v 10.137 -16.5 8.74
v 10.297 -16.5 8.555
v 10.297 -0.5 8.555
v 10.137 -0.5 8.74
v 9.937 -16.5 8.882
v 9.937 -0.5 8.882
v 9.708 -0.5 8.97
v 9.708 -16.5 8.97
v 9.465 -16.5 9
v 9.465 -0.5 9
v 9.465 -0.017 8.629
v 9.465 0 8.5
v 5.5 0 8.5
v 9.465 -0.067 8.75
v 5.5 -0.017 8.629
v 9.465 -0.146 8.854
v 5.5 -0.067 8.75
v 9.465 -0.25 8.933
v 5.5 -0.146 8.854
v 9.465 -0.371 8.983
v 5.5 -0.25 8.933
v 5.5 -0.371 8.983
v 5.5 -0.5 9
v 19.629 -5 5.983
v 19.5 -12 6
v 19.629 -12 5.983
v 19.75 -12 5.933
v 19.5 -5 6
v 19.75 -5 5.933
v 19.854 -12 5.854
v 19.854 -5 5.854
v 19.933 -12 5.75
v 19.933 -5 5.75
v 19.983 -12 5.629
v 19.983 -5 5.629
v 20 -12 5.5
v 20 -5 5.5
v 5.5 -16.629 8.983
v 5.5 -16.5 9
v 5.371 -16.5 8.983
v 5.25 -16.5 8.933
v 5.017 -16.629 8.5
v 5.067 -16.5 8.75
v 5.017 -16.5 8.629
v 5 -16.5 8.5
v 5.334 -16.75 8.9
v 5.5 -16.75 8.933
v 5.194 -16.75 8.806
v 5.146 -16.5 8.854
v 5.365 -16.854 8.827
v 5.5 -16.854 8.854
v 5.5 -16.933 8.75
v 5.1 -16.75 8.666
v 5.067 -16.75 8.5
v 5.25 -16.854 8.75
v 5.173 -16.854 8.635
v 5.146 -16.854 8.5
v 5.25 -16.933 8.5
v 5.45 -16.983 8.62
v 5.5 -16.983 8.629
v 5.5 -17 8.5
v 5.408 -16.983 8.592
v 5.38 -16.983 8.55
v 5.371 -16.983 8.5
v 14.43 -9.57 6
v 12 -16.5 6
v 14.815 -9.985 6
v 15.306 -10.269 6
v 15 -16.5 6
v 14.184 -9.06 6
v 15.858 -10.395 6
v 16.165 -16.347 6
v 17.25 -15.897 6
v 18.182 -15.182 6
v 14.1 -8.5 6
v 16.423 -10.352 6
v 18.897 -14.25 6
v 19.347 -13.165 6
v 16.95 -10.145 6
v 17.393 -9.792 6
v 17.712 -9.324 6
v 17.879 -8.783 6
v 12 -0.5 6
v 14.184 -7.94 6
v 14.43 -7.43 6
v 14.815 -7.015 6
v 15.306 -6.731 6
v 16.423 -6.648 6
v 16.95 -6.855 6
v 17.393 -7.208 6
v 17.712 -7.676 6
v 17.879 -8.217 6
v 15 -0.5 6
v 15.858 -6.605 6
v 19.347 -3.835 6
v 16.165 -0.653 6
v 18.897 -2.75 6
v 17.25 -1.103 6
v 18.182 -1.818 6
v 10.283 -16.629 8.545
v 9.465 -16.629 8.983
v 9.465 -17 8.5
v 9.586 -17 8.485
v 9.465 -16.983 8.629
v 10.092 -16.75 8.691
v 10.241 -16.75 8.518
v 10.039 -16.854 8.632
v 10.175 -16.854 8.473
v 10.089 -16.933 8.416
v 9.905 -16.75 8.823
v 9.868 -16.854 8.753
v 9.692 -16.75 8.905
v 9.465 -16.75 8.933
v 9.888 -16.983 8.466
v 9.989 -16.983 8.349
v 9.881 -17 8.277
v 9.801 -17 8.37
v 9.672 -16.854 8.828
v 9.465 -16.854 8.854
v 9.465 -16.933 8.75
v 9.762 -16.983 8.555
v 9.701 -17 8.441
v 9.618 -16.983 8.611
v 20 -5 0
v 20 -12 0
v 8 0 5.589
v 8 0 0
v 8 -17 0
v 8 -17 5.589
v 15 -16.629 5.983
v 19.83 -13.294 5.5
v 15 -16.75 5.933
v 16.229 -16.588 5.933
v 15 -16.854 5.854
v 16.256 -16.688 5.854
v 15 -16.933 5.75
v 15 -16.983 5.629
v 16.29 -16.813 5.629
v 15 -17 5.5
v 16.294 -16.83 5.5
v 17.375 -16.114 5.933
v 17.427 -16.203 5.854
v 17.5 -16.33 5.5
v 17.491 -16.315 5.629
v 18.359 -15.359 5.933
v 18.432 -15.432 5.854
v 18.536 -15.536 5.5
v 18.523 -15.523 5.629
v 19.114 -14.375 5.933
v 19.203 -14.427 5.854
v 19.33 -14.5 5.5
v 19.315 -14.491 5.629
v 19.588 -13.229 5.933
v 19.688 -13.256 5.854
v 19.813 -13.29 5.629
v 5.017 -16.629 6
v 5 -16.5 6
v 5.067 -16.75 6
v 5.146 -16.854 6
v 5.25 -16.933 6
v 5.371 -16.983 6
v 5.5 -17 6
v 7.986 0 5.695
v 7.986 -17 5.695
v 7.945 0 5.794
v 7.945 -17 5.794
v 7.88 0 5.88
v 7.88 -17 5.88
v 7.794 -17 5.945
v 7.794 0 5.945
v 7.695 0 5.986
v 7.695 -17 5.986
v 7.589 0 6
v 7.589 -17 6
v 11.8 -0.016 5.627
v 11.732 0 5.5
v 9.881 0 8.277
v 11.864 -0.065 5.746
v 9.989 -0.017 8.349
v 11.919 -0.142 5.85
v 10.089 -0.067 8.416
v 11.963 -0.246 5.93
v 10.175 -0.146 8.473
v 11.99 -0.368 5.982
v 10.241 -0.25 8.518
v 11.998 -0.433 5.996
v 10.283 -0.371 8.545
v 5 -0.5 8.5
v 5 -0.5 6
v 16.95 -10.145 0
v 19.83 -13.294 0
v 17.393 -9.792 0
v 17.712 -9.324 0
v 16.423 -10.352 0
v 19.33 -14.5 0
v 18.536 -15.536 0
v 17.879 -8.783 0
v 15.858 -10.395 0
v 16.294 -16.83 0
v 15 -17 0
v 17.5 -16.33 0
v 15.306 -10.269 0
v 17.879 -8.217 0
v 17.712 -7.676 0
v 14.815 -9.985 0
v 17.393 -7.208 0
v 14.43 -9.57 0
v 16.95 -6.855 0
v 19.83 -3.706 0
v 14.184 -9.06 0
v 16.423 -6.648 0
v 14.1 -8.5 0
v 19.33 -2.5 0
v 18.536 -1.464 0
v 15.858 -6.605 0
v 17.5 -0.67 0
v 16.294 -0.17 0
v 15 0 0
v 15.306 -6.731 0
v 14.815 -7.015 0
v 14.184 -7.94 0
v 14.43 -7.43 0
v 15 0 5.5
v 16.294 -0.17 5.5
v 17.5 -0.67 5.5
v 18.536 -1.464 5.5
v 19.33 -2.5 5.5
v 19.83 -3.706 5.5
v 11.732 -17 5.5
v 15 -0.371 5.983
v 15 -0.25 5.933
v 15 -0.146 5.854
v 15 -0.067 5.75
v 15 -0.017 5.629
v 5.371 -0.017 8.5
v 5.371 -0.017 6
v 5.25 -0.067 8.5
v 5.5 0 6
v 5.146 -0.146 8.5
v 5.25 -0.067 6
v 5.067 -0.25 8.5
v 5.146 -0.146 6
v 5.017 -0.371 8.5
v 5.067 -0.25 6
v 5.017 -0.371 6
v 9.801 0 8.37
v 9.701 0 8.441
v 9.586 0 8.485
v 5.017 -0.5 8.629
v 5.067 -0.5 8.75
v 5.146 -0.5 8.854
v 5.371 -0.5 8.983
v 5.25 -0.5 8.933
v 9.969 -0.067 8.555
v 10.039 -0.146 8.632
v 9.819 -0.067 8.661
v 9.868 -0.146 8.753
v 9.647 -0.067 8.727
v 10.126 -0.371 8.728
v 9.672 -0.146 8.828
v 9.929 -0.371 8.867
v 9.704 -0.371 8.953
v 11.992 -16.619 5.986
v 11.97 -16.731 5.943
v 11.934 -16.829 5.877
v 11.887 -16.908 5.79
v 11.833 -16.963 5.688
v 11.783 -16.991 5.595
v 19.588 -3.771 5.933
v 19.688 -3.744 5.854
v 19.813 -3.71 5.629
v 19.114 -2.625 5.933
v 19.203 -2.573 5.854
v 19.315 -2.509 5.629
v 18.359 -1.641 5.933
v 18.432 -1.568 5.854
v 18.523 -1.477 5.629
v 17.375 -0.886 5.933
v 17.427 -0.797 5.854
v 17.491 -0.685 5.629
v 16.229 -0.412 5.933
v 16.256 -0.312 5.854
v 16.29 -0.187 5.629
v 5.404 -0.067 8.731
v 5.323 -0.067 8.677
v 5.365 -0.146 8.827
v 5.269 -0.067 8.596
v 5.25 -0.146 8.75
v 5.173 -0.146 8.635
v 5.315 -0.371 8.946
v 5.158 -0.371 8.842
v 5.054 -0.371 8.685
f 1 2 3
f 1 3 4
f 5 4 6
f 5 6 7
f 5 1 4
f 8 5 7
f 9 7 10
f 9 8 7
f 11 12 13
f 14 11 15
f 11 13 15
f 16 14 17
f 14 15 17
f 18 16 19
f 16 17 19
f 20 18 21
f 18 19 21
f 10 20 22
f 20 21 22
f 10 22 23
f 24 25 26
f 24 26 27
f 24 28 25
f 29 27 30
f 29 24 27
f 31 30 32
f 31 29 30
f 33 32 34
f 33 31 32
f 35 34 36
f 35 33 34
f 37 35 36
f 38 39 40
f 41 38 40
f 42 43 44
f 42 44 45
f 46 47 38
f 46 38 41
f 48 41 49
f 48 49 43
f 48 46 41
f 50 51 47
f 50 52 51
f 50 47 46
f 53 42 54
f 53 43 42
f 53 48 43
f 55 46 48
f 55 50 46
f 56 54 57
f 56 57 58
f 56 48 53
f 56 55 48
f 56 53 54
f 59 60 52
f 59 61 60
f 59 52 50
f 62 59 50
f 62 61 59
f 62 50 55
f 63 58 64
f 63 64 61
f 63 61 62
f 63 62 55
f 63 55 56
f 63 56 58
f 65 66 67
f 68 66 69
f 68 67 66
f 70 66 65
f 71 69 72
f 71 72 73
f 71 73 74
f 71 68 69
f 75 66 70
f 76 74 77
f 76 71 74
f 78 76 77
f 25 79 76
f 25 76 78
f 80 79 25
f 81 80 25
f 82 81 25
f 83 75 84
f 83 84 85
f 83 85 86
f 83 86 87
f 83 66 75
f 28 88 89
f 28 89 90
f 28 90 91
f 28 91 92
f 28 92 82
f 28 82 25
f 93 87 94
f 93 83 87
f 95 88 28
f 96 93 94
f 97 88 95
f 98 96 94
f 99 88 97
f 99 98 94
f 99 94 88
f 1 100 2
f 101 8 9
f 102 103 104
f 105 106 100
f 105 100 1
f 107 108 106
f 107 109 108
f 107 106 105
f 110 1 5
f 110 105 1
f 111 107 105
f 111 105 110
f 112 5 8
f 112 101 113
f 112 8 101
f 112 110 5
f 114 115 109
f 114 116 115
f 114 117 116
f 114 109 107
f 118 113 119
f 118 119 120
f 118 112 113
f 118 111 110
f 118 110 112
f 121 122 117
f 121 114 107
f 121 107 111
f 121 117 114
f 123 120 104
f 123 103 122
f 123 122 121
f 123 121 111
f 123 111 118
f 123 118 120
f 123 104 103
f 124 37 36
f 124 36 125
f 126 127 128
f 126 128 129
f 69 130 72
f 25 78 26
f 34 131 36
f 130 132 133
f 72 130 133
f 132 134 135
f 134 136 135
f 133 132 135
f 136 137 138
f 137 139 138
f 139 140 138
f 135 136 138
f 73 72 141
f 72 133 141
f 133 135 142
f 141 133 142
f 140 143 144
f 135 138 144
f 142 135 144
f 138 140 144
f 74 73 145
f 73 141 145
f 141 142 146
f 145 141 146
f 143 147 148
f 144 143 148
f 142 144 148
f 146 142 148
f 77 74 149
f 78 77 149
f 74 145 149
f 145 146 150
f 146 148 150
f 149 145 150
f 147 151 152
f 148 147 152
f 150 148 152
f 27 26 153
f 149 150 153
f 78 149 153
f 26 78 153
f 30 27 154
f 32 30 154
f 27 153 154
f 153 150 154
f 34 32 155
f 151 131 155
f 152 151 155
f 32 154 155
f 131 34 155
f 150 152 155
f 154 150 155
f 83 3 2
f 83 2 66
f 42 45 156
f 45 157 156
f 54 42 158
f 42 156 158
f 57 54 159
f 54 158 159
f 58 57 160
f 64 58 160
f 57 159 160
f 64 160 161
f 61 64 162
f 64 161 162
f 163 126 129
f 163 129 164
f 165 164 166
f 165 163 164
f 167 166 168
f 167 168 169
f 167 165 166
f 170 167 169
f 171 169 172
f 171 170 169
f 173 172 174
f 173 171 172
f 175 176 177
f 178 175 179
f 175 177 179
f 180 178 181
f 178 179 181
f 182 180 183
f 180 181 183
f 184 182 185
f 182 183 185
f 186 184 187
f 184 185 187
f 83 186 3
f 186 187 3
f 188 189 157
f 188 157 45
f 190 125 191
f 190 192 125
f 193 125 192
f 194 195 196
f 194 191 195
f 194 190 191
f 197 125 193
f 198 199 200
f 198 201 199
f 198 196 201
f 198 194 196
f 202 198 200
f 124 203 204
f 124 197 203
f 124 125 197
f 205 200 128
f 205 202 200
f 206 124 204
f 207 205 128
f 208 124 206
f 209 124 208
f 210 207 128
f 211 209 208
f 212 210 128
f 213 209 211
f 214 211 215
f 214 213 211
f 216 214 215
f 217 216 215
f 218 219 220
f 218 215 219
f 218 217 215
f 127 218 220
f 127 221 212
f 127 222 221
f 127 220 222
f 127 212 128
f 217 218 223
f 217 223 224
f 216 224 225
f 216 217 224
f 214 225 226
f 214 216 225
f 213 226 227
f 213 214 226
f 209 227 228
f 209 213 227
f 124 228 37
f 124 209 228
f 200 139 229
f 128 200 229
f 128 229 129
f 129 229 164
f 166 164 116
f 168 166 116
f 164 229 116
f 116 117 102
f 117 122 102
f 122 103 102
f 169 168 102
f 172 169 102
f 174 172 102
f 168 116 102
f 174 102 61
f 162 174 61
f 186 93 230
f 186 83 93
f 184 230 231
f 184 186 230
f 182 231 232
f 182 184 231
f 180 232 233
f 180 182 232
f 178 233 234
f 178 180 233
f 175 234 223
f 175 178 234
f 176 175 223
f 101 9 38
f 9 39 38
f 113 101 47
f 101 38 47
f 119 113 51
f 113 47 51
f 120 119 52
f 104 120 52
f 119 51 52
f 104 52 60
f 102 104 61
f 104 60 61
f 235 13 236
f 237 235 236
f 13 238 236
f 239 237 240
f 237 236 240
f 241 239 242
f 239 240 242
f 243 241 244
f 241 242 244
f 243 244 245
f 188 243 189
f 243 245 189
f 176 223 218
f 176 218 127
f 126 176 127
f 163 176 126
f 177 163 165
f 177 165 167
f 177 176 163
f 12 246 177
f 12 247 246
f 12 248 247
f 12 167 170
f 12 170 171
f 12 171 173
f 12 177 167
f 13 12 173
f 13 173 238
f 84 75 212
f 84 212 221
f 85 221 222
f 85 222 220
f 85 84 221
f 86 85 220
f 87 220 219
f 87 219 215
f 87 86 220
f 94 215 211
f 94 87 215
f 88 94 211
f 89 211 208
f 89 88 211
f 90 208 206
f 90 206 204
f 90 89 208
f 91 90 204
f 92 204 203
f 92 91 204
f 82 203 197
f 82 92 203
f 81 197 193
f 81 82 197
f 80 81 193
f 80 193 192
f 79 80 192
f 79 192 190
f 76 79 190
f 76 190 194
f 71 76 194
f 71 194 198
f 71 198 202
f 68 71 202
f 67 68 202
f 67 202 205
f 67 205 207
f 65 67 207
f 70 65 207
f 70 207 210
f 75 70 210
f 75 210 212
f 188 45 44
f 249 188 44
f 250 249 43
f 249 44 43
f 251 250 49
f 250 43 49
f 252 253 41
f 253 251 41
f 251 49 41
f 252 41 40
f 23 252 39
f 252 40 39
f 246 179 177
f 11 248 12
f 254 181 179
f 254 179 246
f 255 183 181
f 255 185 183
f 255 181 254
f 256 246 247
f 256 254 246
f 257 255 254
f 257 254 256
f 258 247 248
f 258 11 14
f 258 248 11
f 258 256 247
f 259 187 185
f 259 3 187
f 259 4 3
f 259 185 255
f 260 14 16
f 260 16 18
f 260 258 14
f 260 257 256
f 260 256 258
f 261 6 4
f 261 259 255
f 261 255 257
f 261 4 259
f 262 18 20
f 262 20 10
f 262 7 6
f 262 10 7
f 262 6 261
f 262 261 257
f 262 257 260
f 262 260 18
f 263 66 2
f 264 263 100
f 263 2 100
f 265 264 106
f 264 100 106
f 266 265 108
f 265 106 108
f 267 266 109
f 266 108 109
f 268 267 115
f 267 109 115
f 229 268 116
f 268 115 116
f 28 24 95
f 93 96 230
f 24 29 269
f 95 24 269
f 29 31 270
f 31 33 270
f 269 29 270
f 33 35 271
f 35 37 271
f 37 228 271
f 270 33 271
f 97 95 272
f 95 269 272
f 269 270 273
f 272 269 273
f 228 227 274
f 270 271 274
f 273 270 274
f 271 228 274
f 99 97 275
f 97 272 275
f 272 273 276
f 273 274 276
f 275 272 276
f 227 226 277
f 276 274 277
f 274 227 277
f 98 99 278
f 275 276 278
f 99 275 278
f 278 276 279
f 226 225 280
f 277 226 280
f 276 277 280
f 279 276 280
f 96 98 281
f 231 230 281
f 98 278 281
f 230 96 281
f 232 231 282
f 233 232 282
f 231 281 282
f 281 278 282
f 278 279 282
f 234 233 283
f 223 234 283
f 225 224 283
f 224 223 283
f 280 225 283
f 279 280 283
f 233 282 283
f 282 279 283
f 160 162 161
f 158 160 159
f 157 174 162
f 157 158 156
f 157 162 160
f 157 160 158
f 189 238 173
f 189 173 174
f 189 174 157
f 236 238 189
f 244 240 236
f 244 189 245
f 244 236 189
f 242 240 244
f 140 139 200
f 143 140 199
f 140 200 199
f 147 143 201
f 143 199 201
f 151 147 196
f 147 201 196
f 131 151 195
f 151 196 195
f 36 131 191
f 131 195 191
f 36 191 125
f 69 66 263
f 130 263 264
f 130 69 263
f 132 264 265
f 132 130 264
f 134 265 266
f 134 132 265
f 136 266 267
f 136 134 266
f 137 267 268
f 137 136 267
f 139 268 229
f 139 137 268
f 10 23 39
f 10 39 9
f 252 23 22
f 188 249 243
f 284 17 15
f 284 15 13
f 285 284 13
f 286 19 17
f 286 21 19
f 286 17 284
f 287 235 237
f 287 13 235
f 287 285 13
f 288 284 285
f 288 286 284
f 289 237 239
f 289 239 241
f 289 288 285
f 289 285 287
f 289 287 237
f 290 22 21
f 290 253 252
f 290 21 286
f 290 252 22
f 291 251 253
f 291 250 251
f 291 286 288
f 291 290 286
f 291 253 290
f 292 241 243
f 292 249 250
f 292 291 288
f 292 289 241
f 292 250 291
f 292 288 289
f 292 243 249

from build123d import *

# Parameters (mm, degrees)
F1_DEPTH = 17
F2_R     = 0.5
F3_R     = 1.9
F4_DEPTH = 25
F5_R     = 5
F6_R     = 0.5
F7_R     = 1
F8_R     = 0.49999


# Not quite as in the source:
# - a fillet or chamfer is up to 0.001 mm smaller than in the source, because OpenCascade refuses the exact size


with BuildPart() as f1:
    # F0 (on Front) → F1 (new body)
    with BuildSketch(Plane.XZ):
        with BuildLine():
            Line((-12, 0), (0, 0))
            Line((0, 0), (0, 5.58898558))
            ThreePointArc((0, 5.58898558), (0.1203833365, 5.8796166635), (0.41101442, 6))
            Line((0.41101442, 6), (3, 6))
            Line((3, 6), (3, 9))
            Line((3, 9), (-2, 9))
            Line((-2, 9), (-4, 6))
            Line((-4, 6), (-12, 6))
            Line((-12, 6), (-12, 0))
        make_face()
    extrude(amount=F1_DEPTH)

    # F2
    f2_edges = [f1.edges().sort_by_distance(p)[0] for p in [
        (3, -8.5, 9),
    ]]
    fillet(f2_edges, radius=F2_R)

    # F3 (on face) → F4 (cut)
    with BuildSketch(Plane.XY.offset(6)):
        with Locations((-8, -8.5)):
            Circle(F3_R)
    extrude(amount=-F4_DEPTH, mode=Mode.SUBTRACT)

    # F5
    f5_edges = [f1.edges().sort_by_distance(p)[0] for p in [
        (-12, -17, 3),
        (-12, 0, 3),
    ]]
    fillet(f5_edges, radius=F5_R)

    # F6
    f6_edges = [f1.edges().sort_by_distance(p)[0] for p in [
        (-10.535534, -15.535534, 6),
    ]]
    fillet(f6_edges, radius=F6_R)

    # F7
    f7_edges = [f1.edges().sort_by_distance(p)[0] for p in [
        (-2, -8.5, 9),
    ]]
    fillet(f7_edges, radius=F7_R)

    # F8 (radius 0.5 in the source; OpenCascade refuses exactly that, so slightly less here)
    f8_edges = [f1.edges().sort_by_distance(p)[0] for p in [
        (-3.148433, -17, 7.27735),
        (-3.148433, 0, 7.27735),
    ]]
    fillet(f8_edges, radius=F8_R)


with BuildPart() as f10_1:
    # F10: instance of F1
    add(f1.part.mirror(Plane(origin=(4, -8.5, 7.25), x_dir=(0, 1, 0), z_dir=(1, 0, 0))))


solid = f10_1.part
